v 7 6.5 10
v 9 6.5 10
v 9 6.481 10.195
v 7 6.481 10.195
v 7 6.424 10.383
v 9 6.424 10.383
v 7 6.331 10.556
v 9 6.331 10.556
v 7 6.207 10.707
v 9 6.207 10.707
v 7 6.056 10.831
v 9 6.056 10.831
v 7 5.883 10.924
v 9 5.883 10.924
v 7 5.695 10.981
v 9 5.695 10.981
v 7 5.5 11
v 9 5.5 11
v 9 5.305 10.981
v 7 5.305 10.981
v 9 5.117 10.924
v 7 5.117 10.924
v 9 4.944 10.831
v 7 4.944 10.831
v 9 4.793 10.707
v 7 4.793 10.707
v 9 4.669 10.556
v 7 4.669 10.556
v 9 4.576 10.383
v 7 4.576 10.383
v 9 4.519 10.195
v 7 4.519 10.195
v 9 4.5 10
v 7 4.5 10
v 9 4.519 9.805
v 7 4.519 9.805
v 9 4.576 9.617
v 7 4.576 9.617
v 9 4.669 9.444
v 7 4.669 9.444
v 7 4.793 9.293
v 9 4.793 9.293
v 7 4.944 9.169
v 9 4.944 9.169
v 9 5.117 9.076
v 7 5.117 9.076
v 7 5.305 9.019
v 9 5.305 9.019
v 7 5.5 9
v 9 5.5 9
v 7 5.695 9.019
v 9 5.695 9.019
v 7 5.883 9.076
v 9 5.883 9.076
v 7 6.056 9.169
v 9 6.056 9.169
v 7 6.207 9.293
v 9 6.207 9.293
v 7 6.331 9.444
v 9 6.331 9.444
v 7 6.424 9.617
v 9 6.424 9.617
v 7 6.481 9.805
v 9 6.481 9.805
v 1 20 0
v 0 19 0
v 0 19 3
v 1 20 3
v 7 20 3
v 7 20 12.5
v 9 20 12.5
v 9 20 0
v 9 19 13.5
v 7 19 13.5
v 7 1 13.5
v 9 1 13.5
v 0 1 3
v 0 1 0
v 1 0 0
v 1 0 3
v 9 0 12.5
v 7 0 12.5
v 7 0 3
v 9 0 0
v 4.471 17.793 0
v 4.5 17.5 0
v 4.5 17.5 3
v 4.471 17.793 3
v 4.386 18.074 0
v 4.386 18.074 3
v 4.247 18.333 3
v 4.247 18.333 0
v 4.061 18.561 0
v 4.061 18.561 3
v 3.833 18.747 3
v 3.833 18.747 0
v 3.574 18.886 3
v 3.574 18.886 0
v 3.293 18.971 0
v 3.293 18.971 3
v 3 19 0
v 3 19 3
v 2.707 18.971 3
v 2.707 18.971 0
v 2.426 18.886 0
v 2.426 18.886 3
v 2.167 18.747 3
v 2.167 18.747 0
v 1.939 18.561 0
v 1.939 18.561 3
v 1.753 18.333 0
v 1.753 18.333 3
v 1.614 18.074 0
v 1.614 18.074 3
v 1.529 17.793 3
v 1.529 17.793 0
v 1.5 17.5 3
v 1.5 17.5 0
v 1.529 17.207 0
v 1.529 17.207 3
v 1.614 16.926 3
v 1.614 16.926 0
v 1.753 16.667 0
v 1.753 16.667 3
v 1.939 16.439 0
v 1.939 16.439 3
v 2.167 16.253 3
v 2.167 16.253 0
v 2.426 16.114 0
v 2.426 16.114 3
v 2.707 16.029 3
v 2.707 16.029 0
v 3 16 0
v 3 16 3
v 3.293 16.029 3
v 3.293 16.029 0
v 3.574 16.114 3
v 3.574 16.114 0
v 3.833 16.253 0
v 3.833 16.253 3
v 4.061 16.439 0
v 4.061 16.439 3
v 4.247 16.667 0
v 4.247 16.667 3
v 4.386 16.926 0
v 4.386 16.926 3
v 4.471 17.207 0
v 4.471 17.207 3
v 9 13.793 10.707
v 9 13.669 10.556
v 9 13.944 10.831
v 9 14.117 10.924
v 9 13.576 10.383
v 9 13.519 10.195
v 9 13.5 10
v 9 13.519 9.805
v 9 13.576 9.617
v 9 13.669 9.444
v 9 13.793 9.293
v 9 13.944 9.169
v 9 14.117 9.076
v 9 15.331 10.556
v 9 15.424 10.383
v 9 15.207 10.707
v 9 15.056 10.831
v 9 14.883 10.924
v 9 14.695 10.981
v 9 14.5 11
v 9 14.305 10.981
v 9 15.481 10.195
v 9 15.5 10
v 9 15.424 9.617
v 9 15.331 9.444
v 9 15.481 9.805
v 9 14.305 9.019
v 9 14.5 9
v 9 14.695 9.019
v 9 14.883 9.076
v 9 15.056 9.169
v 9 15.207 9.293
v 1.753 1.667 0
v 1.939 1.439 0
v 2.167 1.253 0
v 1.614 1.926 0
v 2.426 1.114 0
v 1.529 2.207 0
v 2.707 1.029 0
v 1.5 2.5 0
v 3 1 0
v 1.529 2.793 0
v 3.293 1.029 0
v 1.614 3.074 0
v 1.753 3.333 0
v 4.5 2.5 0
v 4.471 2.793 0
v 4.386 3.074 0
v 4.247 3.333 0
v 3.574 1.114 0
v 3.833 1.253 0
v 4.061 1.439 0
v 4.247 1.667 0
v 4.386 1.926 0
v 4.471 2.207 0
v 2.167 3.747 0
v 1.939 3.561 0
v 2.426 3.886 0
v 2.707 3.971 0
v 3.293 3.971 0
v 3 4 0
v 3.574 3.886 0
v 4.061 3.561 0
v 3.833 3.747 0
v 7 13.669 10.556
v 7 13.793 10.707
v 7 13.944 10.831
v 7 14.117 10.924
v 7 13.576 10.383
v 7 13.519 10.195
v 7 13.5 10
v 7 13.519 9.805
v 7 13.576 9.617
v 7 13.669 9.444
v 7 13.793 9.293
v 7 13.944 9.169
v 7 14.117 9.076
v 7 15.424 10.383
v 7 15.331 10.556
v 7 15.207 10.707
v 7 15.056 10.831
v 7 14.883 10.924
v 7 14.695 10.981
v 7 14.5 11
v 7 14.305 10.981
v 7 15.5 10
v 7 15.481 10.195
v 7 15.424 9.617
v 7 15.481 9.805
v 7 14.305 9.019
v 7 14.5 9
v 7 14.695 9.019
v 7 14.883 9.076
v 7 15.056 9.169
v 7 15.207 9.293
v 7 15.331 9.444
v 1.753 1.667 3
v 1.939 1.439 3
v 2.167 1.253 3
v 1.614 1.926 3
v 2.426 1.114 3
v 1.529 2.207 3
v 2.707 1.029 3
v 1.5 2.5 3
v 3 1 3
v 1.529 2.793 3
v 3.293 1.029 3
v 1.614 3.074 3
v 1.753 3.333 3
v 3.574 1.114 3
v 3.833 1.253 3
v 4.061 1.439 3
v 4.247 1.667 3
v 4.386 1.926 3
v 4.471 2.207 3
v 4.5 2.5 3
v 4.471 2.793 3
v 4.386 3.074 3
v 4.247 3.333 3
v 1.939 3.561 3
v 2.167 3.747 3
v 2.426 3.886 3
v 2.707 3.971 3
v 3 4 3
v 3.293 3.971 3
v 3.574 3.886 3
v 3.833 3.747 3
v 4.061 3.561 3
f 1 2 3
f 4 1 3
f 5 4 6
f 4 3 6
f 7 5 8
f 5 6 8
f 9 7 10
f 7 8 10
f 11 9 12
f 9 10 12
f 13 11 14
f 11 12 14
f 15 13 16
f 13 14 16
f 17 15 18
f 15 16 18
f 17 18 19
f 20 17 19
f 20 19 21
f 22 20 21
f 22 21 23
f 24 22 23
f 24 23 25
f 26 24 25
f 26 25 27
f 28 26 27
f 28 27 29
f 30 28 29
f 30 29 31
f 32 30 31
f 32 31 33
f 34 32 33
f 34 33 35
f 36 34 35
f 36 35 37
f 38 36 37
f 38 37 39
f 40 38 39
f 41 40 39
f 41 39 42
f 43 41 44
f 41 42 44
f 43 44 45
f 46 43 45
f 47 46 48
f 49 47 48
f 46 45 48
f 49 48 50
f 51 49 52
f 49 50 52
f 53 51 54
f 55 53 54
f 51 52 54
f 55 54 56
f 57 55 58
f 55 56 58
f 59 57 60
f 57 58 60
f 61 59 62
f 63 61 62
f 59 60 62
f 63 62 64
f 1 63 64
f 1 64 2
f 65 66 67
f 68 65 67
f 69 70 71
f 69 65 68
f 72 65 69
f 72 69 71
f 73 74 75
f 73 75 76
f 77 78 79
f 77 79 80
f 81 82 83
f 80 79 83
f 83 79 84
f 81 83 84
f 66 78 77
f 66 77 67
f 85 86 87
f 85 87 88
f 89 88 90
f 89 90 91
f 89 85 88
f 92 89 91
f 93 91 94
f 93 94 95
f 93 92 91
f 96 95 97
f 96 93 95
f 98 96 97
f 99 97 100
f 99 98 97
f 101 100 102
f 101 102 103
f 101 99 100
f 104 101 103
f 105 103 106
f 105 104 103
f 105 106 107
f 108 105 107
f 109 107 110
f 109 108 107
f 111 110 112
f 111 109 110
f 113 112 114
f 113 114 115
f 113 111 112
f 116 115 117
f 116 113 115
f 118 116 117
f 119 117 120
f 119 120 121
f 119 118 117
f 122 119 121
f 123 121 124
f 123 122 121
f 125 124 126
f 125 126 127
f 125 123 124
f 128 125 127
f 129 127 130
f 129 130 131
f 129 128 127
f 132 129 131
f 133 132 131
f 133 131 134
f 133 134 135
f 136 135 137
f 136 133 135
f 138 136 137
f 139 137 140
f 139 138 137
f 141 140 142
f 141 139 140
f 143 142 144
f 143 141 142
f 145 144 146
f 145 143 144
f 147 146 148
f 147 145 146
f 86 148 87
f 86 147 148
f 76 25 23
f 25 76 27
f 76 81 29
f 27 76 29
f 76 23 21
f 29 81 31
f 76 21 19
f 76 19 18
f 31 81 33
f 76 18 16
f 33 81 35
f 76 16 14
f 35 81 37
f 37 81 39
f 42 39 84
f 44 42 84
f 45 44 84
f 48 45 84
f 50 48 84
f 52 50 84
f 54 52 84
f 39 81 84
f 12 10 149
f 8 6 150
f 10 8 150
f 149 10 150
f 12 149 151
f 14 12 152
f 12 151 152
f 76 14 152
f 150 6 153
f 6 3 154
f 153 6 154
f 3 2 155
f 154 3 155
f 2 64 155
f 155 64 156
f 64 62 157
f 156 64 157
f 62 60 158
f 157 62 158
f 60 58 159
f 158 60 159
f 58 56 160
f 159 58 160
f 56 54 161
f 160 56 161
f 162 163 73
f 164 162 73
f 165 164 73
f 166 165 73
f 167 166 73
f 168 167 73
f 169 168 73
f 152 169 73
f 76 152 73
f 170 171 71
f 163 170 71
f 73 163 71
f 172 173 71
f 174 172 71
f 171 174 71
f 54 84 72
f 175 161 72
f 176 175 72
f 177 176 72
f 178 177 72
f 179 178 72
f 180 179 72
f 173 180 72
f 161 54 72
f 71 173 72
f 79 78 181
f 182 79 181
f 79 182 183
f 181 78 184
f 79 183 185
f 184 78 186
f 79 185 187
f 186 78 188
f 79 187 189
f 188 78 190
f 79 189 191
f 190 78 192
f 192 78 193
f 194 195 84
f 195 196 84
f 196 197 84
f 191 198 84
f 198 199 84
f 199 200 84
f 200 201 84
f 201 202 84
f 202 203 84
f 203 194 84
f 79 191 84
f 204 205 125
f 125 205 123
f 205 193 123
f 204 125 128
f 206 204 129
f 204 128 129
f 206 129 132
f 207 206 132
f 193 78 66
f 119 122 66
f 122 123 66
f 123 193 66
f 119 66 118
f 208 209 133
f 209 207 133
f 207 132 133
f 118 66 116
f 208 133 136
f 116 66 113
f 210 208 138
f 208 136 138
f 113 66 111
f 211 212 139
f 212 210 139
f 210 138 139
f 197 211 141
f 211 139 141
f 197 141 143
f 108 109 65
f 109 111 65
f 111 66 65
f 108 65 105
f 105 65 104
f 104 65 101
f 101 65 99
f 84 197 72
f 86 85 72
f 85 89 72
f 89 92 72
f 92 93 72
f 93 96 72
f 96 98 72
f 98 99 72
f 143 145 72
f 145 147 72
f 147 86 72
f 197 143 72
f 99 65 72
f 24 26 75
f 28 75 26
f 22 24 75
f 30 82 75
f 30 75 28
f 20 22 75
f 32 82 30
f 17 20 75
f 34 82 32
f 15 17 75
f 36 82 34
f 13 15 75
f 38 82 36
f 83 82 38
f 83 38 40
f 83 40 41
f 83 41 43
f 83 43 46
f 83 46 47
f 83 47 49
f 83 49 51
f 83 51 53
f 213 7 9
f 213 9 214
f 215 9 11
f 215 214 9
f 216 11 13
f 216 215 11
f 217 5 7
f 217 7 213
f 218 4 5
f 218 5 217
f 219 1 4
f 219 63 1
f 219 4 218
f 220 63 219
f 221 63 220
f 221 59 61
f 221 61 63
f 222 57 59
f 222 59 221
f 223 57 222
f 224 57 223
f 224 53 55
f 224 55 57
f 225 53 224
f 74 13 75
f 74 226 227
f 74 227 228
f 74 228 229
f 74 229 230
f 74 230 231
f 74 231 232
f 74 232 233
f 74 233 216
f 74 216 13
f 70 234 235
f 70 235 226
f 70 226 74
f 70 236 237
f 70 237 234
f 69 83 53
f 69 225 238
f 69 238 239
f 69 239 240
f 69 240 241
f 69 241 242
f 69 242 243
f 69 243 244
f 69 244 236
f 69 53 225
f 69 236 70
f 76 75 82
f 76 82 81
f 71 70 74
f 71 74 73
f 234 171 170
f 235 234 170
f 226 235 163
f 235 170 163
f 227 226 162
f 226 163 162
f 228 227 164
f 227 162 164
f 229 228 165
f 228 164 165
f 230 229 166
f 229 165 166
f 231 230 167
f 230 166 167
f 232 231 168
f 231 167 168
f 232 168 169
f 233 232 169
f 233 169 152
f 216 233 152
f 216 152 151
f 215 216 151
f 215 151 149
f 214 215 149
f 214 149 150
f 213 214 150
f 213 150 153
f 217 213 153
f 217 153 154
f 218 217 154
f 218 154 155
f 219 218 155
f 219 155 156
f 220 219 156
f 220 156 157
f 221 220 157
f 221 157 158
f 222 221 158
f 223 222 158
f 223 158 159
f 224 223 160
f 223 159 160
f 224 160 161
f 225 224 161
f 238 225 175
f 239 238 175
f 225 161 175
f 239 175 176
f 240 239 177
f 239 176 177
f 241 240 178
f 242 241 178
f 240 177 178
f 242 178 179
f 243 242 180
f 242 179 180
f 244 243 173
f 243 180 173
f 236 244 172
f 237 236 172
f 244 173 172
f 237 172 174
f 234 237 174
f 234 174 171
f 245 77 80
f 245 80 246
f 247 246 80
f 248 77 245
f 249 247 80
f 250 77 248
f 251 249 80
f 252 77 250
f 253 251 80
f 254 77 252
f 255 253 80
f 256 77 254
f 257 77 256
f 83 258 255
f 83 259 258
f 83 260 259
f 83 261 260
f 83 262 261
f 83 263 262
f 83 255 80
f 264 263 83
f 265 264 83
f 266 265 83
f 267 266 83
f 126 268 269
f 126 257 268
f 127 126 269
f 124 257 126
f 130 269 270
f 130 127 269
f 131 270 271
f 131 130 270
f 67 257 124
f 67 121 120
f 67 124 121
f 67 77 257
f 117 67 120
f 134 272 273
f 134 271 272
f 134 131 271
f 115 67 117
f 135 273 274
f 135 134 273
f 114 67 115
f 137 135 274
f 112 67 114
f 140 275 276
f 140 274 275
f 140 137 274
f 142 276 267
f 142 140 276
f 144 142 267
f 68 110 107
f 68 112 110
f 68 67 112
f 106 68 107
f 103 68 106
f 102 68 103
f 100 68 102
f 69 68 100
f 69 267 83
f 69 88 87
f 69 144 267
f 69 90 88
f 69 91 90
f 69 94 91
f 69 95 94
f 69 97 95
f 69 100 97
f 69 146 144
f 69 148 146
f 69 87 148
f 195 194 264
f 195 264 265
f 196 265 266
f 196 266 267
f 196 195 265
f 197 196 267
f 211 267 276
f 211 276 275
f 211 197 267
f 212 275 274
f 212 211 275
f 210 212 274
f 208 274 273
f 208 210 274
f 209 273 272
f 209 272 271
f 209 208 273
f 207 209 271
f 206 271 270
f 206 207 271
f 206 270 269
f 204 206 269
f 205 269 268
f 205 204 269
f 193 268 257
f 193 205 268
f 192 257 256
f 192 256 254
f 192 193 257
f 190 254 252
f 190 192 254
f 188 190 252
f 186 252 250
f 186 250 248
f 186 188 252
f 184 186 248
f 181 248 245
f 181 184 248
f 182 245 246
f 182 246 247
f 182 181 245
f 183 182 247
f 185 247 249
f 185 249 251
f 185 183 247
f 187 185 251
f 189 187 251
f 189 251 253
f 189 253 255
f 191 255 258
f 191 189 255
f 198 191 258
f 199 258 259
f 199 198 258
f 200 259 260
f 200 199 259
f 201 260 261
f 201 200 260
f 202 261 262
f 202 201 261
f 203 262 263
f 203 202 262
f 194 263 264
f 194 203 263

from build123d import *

# Parameters (mm, degrees)
SKETCH_W     = 9
SKETCH_H     = 20
SKETCH_R     = 1.5
PAD_DEPTH    = 3
SKETCH001_W  = 2
SKETCH001_H  = 20
PAD001_DEPTH = 10.5
SKETCH002_R  = 1
POCKET_DEPTH = 5
CHAMFER_SIZE = 1


with BuildPart() as part:
    # Sketch → Pad (new body)
    with BuildSketch(Plane.XY):
        with Locations((4.5, 10)):
            Rectangle(SKETCH_W, SKETCH_H)
        with Locations((3, 17.5)):
            Circle(SKETCH_R, mode=Mode.SUBTRACT)
        with Locations((3, 2.5)):
            Circle(SKETCH_R, mode=Mode.SUBTRACT)
    extrude(amount=PAD_DEPTH)

    # Sketch001 (on Face8 of Pad) → Pad001 (join)
    with BuildSketch(Plane.XY.offset(3)):
        with Locations((8, 10)):
            Rectangle(SKETCH001_W, SKETCH001_H)
    extrude(amount=PAD001_DEPTH)

    # Sketch002 (on Face8 of Pad001) → Pocket (cut)
    with BuildSketch(Plane.YZ.offset(9)):
        with Locations((5.5, 10)):
            Circle(SKETCH002_R)
        with Locations((14.5, 10)):
            Circle(SKETCH002_R)
    extrude(amount=-POCKET_DEPTH, mode=Mode.SUBTRACT)

    # Chamfer
    chamfer_edges = [part.edges().sort_by_distance(p)[0] for p in [
        (8, 0, 13.5),
        (8, 20, 13.5),
        (0, 0, 1.5),
        (0, 20, 1.5),
    ]]
    chamfer(chamfer_edges, length=CHAMFER_SIZE)


solid = part.part
